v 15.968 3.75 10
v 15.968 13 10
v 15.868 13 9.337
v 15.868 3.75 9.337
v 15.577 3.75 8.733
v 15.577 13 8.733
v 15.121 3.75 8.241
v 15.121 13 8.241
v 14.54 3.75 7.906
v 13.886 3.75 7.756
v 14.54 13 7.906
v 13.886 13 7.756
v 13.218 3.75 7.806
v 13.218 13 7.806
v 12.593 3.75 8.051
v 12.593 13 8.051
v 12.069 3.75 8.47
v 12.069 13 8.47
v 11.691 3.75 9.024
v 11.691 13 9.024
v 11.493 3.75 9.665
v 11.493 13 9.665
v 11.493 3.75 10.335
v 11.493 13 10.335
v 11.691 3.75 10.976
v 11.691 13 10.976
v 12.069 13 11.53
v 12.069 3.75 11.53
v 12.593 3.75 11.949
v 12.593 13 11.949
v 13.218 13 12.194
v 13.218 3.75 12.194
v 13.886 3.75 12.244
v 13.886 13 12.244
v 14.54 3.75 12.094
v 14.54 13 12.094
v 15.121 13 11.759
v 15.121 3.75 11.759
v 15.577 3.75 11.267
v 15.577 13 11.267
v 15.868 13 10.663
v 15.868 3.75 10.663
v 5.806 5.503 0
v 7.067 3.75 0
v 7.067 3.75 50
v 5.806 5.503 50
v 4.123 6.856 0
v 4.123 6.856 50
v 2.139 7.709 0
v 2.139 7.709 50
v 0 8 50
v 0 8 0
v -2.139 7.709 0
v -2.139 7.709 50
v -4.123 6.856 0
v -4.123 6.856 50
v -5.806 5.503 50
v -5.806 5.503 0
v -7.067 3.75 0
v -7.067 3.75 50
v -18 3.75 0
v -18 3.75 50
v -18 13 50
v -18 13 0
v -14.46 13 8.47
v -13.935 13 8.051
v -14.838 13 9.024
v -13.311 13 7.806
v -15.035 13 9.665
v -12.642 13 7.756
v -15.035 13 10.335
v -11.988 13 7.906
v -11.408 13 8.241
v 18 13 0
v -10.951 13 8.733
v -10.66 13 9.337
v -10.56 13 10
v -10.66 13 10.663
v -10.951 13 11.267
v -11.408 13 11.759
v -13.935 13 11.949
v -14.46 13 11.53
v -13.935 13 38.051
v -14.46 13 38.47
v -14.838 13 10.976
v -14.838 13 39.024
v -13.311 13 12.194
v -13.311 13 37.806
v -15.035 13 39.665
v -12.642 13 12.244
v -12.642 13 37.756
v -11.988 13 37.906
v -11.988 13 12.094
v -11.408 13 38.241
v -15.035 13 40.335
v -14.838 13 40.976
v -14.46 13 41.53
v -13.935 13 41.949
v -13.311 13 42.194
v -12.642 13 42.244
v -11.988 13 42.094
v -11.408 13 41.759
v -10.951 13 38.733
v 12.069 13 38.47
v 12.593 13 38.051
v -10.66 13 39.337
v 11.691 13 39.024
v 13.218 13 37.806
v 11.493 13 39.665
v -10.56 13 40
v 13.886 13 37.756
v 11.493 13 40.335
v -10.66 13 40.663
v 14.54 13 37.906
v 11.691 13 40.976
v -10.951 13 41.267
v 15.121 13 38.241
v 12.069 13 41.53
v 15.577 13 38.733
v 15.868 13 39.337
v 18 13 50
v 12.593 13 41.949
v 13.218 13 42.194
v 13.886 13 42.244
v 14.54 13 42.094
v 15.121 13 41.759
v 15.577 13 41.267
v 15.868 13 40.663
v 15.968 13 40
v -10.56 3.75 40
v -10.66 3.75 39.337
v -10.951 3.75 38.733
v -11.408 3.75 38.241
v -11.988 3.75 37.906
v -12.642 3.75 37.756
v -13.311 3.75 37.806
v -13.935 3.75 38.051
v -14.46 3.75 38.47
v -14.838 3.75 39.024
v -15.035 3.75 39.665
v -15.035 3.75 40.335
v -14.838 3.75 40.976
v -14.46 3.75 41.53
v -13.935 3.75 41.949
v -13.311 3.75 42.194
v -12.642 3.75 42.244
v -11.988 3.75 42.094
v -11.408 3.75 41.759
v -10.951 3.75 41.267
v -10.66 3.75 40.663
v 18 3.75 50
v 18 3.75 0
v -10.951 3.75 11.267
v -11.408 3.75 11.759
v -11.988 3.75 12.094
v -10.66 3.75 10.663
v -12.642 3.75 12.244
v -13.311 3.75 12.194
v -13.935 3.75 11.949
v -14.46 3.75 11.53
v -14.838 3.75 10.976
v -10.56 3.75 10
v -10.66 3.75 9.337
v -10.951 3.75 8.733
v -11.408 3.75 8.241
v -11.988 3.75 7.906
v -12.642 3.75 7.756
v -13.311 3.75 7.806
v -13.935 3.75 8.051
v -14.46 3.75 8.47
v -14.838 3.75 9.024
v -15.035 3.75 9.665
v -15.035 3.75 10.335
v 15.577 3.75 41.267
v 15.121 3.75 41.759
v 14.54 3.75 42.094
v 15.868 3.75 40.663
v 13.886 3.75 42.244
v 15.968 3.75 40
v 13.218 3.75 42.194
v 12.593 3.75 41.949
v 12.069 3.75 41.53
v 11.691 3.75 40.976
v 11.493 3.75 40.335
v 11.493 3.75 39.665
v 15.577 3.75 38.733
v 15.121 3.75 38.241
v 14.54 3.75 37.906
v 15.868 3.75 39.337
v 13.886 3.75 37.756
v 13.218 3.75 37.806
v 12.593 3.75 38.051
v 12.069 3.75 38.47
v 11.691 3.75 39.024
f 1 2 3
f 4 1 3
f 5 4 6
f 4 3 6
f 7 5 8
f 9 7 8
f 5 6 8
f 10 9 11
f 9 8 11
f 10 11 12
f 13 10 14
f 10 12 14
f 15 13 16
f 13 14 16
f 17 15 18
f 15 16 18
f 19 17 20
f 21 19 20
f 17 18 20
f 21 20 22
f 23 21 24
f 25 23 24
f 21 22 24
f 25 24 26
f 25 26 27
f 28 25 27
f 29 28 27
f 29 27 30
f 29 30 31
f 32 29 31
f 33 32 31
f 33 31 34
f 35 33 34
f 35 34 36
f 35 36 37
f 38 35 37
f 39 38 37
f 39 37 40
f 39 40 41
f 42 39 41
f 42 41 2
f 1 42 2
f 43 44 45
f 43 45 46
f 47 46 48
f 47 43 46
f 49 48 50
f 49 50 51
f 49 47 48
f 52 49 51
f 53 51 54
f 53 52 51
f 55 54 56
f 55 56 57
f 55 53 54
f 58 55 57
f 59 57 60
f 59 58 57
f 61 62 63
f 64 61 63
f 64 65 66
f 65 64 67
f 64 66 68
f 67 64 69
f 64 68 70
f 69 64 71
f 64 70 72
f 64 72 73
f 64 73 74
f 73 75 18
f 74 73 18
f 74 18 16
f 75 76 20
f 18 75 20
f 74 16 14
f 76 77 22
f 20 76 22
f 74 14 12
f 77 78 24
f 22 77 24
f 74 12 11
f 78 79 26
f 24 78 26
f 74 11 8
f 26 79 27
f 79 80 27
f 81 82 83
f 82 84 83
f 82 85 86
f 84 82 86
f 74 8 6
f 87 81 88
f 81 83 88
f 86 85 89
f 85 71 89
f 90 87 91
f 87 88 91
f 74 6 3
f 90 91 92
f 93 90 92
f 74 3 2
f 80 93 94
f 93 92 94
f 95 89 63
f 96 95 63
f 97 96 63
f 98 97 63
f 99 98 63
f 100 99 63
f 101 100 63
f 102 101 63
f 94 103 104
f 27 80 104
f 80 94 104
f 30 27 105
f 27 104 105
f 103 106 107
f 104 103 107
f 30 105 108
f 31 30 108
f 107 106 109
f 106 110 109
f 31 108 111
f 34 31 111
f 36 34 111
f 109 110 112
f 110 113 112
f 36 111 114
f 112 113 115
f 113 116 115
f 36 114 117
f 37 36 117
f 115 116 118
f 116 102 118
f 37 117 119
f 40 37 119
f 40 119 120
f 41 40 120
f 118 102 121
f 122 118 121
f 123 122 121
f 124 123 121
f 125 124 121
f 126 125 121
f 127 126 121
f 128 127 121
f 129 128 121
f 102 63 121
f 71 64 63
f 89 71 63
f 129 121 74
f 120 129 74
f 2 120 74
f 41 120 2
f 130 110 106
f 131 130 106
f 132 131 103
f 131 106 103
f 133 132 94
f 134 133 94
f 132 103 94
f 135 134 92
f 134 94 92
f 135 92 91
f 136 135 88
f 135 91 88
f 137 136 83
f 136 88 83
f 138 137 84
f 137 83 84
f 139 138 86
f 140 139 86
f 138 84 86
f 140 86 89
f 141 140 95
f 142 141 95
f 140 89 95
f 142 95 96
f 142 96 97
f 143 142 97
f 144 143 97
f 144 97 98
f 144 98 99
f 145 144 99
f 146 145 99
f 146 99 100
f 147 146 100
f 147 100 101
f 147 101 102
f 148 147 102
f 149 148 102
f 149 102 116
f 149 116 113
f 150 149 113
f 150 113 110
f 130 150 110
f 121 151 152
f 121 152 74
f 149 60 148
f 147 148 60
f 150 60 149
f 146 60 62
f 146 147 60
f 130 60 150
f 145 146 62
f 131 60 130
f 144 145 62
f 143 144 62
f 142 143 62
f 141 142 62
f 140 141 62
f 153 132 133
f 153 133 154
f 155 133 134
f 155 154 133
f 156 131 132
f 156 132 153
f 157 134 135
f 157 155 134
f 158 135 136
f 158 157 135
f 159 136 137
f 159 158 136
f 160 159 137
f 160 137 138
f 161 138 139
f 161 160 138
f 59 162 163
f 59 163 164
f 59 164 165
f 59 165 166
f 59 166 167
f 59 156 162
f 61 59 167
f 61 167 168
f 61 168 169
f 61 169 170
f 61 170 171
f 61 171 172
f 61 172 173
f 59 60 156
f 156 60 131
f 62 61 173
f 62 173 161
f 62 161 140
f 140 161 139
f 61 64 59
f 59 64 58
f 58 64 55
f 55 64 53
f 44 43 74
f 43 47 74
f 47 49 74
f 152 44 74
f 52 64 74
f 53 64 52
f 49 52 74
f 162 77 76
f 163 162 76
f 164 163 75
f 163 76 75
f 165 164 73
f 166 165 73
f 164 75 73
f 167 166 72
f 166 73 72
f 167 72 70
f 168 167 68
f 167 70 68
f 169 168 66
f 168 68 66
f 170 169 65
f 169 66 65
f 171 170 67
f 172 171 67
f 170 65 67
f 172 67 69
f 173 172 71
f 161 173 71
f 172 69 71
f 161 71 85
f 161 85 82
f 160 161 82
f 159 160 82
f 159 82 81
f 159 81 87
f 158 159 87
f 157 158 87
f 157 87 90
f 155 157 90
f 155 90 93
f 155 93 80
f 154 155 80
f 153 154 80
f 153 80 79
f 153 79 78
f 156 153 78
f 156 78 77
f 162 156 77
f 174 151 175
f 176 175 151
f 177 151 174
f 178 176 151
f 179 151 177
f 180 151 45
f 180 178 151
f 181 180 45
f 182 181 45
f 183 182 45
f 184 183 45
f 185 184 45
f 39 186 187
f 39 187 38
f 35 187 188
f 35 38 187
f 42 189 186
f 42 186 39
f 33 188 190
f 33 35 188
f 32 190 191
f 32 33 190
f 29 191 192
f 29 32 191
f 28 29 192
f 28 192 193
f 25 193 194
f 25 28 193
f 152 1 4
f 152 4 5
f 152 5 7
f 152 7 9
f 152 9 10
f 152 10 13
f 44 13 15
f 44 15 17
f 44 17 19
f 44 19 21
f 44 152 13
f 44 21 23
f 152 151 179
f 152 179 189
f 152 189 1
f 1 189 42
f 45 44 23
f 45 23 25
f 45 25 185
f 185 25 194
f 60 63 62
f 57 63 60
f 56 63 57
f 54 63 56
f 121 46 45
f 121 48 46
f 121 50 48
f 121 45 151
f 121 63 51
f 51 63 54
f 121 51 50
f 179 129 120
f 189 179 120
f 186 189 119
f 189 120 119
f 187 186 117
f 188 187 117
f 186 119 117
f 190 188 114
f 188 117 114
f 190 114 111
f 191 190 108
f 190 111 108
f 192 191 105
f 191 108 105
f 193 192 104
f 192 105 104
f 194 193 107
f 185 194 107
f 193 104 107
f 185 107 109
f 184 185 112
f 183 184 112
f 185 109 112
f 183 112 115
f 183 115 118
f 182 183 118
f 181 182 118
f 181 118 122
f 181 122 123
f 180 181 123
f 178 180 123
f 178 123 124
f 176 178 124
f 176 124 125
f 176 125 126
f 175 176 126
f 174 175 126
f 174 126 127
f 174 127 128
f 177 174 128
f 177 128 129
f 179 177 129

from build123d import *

# Parameters (mm, degrees)
IZIM1_W                     = 36
IZIM1_H                     = 36
IZIM1_R                     = 8
Y_KSEKLIK_EKSTR_ZYON1_DEPTH = 50
IZIM2_W                     = 36
IZIM2_H                     = 5
KES_EKSTR_ZYON1_DEPTH       = 50
IZIM3_W                     = 36
IZIM3_H                     = 3
KES_EKSTR_ZYON2_DEPTH       = 50
KES_EKSTR_ZYON3_DEPTH       = 50
M4_BO_LUKLU_DELIK1_D        = 4.5
KES_EKSTR_ZYON6_START       = -50
KES_EKSTR_ZYON6_DEPTH       = 50


# Read off the part's stored shape, not the designer's step: Kes-Ekstrüzyon6
with BuildPart() as part:
    # Çizim1 → Yükseklik-Ekstrüzyon1 (new body)
    with BuildSketch(Plane.XY):
        Rectangle(IZIM1_W, IZIM1_H)
        Circle(IZIM1_R, mode=Mode.SUBTRACT)
    extrude(amount=Y_KSEKLIK_EKSTR_ZYON1_DEPTH)

    # Çizim2 → Kes-Ekstrüzyon1 (cut)
    with BuildSketch(Plane.XY.offset(50)):
        with Locations((0, 15.5)):
            Rectangle(IZIM2_W, IZIM2_H)
    extrude(amount=-KES_EKSTR_ZYON1_DEPTH, mode=Mode.SUBTRACT)

    # Çizim3 → Kes-Ekstrüzyon2 (cut)
    with BuildSketch(Plane.XY.offset(50)):
        with Locations((0, -16.5)):
            Rectangle(IZIM3_W, IZIM3_H)
    extrude(amount=-KES_EKSTR_ZYON2_DEPTH, mode=Mode.SUBTRACT)

    # Çizim4 → Kes-Ekstrüzyon3 (cut)
    with BuildSketch(Plane.XY.offset(50)):
        Polygon((-6.350852961, -11), (-9.526279442, -5.5), (-18, -5.5), (-18, -15), (18, -15), (18, -5.5), (9.526279442, -5.5), (6.350852961, -11), align=None)
    extrude(amount=-KES_EKSTR_ZYON3_DEPTH, mode=Mode.SUBTRACT)

    # M4 Boşluklu Delik1 (through all)
    with Locations(Plane(origin=(0, -5.5, 0), x_dir=(-1, 0, 0), z_dir=(0, -1, 0))):
        with Locations((-13.718329125, -40), (-13.718329125, -10), (12.810498521, -10), (12.810498521, -40)):
            Hole(M4_BO_LUKLU_DELIK1_D / 2)

    # Kes-Ekstrüzyon6 outline → Kes-Ekstrüzyon6 (cut)
    with BuildSketch(Plane.XY.offset(50).offset(KES_EKSTR_ZYON6_START)):
        with BuildLine():
            Line((18, -5.5), (18, 3.75))
            Line((18, 3.75), (7.066647013, 3.75))
            ThreePointArc((7.066647013, 3.75), (0, -8), (-7.066647013, 3.75))
            Line((-7.066647013, 3.75), (-18, 3.75))
            Line((-18, 3.75), (-18, -5.5))
            Line((-18, -5.5), (-9.526279442, -5.5))
            Line((-9.526279442, -5.5), (-6.350852961, -11))
            Line((-6.350852961, -11), (6.350852961, -11))
            Line((6.350852961, -11), (9.526279442, -5.5))
            Line((9.526279442, -5.5), (18, -5.5))
        make_face()
    extrude(amount=KES_EKSTR_ZYON6_DEPTH, mode=Mode.SUBTRACT)


solid = part.part
